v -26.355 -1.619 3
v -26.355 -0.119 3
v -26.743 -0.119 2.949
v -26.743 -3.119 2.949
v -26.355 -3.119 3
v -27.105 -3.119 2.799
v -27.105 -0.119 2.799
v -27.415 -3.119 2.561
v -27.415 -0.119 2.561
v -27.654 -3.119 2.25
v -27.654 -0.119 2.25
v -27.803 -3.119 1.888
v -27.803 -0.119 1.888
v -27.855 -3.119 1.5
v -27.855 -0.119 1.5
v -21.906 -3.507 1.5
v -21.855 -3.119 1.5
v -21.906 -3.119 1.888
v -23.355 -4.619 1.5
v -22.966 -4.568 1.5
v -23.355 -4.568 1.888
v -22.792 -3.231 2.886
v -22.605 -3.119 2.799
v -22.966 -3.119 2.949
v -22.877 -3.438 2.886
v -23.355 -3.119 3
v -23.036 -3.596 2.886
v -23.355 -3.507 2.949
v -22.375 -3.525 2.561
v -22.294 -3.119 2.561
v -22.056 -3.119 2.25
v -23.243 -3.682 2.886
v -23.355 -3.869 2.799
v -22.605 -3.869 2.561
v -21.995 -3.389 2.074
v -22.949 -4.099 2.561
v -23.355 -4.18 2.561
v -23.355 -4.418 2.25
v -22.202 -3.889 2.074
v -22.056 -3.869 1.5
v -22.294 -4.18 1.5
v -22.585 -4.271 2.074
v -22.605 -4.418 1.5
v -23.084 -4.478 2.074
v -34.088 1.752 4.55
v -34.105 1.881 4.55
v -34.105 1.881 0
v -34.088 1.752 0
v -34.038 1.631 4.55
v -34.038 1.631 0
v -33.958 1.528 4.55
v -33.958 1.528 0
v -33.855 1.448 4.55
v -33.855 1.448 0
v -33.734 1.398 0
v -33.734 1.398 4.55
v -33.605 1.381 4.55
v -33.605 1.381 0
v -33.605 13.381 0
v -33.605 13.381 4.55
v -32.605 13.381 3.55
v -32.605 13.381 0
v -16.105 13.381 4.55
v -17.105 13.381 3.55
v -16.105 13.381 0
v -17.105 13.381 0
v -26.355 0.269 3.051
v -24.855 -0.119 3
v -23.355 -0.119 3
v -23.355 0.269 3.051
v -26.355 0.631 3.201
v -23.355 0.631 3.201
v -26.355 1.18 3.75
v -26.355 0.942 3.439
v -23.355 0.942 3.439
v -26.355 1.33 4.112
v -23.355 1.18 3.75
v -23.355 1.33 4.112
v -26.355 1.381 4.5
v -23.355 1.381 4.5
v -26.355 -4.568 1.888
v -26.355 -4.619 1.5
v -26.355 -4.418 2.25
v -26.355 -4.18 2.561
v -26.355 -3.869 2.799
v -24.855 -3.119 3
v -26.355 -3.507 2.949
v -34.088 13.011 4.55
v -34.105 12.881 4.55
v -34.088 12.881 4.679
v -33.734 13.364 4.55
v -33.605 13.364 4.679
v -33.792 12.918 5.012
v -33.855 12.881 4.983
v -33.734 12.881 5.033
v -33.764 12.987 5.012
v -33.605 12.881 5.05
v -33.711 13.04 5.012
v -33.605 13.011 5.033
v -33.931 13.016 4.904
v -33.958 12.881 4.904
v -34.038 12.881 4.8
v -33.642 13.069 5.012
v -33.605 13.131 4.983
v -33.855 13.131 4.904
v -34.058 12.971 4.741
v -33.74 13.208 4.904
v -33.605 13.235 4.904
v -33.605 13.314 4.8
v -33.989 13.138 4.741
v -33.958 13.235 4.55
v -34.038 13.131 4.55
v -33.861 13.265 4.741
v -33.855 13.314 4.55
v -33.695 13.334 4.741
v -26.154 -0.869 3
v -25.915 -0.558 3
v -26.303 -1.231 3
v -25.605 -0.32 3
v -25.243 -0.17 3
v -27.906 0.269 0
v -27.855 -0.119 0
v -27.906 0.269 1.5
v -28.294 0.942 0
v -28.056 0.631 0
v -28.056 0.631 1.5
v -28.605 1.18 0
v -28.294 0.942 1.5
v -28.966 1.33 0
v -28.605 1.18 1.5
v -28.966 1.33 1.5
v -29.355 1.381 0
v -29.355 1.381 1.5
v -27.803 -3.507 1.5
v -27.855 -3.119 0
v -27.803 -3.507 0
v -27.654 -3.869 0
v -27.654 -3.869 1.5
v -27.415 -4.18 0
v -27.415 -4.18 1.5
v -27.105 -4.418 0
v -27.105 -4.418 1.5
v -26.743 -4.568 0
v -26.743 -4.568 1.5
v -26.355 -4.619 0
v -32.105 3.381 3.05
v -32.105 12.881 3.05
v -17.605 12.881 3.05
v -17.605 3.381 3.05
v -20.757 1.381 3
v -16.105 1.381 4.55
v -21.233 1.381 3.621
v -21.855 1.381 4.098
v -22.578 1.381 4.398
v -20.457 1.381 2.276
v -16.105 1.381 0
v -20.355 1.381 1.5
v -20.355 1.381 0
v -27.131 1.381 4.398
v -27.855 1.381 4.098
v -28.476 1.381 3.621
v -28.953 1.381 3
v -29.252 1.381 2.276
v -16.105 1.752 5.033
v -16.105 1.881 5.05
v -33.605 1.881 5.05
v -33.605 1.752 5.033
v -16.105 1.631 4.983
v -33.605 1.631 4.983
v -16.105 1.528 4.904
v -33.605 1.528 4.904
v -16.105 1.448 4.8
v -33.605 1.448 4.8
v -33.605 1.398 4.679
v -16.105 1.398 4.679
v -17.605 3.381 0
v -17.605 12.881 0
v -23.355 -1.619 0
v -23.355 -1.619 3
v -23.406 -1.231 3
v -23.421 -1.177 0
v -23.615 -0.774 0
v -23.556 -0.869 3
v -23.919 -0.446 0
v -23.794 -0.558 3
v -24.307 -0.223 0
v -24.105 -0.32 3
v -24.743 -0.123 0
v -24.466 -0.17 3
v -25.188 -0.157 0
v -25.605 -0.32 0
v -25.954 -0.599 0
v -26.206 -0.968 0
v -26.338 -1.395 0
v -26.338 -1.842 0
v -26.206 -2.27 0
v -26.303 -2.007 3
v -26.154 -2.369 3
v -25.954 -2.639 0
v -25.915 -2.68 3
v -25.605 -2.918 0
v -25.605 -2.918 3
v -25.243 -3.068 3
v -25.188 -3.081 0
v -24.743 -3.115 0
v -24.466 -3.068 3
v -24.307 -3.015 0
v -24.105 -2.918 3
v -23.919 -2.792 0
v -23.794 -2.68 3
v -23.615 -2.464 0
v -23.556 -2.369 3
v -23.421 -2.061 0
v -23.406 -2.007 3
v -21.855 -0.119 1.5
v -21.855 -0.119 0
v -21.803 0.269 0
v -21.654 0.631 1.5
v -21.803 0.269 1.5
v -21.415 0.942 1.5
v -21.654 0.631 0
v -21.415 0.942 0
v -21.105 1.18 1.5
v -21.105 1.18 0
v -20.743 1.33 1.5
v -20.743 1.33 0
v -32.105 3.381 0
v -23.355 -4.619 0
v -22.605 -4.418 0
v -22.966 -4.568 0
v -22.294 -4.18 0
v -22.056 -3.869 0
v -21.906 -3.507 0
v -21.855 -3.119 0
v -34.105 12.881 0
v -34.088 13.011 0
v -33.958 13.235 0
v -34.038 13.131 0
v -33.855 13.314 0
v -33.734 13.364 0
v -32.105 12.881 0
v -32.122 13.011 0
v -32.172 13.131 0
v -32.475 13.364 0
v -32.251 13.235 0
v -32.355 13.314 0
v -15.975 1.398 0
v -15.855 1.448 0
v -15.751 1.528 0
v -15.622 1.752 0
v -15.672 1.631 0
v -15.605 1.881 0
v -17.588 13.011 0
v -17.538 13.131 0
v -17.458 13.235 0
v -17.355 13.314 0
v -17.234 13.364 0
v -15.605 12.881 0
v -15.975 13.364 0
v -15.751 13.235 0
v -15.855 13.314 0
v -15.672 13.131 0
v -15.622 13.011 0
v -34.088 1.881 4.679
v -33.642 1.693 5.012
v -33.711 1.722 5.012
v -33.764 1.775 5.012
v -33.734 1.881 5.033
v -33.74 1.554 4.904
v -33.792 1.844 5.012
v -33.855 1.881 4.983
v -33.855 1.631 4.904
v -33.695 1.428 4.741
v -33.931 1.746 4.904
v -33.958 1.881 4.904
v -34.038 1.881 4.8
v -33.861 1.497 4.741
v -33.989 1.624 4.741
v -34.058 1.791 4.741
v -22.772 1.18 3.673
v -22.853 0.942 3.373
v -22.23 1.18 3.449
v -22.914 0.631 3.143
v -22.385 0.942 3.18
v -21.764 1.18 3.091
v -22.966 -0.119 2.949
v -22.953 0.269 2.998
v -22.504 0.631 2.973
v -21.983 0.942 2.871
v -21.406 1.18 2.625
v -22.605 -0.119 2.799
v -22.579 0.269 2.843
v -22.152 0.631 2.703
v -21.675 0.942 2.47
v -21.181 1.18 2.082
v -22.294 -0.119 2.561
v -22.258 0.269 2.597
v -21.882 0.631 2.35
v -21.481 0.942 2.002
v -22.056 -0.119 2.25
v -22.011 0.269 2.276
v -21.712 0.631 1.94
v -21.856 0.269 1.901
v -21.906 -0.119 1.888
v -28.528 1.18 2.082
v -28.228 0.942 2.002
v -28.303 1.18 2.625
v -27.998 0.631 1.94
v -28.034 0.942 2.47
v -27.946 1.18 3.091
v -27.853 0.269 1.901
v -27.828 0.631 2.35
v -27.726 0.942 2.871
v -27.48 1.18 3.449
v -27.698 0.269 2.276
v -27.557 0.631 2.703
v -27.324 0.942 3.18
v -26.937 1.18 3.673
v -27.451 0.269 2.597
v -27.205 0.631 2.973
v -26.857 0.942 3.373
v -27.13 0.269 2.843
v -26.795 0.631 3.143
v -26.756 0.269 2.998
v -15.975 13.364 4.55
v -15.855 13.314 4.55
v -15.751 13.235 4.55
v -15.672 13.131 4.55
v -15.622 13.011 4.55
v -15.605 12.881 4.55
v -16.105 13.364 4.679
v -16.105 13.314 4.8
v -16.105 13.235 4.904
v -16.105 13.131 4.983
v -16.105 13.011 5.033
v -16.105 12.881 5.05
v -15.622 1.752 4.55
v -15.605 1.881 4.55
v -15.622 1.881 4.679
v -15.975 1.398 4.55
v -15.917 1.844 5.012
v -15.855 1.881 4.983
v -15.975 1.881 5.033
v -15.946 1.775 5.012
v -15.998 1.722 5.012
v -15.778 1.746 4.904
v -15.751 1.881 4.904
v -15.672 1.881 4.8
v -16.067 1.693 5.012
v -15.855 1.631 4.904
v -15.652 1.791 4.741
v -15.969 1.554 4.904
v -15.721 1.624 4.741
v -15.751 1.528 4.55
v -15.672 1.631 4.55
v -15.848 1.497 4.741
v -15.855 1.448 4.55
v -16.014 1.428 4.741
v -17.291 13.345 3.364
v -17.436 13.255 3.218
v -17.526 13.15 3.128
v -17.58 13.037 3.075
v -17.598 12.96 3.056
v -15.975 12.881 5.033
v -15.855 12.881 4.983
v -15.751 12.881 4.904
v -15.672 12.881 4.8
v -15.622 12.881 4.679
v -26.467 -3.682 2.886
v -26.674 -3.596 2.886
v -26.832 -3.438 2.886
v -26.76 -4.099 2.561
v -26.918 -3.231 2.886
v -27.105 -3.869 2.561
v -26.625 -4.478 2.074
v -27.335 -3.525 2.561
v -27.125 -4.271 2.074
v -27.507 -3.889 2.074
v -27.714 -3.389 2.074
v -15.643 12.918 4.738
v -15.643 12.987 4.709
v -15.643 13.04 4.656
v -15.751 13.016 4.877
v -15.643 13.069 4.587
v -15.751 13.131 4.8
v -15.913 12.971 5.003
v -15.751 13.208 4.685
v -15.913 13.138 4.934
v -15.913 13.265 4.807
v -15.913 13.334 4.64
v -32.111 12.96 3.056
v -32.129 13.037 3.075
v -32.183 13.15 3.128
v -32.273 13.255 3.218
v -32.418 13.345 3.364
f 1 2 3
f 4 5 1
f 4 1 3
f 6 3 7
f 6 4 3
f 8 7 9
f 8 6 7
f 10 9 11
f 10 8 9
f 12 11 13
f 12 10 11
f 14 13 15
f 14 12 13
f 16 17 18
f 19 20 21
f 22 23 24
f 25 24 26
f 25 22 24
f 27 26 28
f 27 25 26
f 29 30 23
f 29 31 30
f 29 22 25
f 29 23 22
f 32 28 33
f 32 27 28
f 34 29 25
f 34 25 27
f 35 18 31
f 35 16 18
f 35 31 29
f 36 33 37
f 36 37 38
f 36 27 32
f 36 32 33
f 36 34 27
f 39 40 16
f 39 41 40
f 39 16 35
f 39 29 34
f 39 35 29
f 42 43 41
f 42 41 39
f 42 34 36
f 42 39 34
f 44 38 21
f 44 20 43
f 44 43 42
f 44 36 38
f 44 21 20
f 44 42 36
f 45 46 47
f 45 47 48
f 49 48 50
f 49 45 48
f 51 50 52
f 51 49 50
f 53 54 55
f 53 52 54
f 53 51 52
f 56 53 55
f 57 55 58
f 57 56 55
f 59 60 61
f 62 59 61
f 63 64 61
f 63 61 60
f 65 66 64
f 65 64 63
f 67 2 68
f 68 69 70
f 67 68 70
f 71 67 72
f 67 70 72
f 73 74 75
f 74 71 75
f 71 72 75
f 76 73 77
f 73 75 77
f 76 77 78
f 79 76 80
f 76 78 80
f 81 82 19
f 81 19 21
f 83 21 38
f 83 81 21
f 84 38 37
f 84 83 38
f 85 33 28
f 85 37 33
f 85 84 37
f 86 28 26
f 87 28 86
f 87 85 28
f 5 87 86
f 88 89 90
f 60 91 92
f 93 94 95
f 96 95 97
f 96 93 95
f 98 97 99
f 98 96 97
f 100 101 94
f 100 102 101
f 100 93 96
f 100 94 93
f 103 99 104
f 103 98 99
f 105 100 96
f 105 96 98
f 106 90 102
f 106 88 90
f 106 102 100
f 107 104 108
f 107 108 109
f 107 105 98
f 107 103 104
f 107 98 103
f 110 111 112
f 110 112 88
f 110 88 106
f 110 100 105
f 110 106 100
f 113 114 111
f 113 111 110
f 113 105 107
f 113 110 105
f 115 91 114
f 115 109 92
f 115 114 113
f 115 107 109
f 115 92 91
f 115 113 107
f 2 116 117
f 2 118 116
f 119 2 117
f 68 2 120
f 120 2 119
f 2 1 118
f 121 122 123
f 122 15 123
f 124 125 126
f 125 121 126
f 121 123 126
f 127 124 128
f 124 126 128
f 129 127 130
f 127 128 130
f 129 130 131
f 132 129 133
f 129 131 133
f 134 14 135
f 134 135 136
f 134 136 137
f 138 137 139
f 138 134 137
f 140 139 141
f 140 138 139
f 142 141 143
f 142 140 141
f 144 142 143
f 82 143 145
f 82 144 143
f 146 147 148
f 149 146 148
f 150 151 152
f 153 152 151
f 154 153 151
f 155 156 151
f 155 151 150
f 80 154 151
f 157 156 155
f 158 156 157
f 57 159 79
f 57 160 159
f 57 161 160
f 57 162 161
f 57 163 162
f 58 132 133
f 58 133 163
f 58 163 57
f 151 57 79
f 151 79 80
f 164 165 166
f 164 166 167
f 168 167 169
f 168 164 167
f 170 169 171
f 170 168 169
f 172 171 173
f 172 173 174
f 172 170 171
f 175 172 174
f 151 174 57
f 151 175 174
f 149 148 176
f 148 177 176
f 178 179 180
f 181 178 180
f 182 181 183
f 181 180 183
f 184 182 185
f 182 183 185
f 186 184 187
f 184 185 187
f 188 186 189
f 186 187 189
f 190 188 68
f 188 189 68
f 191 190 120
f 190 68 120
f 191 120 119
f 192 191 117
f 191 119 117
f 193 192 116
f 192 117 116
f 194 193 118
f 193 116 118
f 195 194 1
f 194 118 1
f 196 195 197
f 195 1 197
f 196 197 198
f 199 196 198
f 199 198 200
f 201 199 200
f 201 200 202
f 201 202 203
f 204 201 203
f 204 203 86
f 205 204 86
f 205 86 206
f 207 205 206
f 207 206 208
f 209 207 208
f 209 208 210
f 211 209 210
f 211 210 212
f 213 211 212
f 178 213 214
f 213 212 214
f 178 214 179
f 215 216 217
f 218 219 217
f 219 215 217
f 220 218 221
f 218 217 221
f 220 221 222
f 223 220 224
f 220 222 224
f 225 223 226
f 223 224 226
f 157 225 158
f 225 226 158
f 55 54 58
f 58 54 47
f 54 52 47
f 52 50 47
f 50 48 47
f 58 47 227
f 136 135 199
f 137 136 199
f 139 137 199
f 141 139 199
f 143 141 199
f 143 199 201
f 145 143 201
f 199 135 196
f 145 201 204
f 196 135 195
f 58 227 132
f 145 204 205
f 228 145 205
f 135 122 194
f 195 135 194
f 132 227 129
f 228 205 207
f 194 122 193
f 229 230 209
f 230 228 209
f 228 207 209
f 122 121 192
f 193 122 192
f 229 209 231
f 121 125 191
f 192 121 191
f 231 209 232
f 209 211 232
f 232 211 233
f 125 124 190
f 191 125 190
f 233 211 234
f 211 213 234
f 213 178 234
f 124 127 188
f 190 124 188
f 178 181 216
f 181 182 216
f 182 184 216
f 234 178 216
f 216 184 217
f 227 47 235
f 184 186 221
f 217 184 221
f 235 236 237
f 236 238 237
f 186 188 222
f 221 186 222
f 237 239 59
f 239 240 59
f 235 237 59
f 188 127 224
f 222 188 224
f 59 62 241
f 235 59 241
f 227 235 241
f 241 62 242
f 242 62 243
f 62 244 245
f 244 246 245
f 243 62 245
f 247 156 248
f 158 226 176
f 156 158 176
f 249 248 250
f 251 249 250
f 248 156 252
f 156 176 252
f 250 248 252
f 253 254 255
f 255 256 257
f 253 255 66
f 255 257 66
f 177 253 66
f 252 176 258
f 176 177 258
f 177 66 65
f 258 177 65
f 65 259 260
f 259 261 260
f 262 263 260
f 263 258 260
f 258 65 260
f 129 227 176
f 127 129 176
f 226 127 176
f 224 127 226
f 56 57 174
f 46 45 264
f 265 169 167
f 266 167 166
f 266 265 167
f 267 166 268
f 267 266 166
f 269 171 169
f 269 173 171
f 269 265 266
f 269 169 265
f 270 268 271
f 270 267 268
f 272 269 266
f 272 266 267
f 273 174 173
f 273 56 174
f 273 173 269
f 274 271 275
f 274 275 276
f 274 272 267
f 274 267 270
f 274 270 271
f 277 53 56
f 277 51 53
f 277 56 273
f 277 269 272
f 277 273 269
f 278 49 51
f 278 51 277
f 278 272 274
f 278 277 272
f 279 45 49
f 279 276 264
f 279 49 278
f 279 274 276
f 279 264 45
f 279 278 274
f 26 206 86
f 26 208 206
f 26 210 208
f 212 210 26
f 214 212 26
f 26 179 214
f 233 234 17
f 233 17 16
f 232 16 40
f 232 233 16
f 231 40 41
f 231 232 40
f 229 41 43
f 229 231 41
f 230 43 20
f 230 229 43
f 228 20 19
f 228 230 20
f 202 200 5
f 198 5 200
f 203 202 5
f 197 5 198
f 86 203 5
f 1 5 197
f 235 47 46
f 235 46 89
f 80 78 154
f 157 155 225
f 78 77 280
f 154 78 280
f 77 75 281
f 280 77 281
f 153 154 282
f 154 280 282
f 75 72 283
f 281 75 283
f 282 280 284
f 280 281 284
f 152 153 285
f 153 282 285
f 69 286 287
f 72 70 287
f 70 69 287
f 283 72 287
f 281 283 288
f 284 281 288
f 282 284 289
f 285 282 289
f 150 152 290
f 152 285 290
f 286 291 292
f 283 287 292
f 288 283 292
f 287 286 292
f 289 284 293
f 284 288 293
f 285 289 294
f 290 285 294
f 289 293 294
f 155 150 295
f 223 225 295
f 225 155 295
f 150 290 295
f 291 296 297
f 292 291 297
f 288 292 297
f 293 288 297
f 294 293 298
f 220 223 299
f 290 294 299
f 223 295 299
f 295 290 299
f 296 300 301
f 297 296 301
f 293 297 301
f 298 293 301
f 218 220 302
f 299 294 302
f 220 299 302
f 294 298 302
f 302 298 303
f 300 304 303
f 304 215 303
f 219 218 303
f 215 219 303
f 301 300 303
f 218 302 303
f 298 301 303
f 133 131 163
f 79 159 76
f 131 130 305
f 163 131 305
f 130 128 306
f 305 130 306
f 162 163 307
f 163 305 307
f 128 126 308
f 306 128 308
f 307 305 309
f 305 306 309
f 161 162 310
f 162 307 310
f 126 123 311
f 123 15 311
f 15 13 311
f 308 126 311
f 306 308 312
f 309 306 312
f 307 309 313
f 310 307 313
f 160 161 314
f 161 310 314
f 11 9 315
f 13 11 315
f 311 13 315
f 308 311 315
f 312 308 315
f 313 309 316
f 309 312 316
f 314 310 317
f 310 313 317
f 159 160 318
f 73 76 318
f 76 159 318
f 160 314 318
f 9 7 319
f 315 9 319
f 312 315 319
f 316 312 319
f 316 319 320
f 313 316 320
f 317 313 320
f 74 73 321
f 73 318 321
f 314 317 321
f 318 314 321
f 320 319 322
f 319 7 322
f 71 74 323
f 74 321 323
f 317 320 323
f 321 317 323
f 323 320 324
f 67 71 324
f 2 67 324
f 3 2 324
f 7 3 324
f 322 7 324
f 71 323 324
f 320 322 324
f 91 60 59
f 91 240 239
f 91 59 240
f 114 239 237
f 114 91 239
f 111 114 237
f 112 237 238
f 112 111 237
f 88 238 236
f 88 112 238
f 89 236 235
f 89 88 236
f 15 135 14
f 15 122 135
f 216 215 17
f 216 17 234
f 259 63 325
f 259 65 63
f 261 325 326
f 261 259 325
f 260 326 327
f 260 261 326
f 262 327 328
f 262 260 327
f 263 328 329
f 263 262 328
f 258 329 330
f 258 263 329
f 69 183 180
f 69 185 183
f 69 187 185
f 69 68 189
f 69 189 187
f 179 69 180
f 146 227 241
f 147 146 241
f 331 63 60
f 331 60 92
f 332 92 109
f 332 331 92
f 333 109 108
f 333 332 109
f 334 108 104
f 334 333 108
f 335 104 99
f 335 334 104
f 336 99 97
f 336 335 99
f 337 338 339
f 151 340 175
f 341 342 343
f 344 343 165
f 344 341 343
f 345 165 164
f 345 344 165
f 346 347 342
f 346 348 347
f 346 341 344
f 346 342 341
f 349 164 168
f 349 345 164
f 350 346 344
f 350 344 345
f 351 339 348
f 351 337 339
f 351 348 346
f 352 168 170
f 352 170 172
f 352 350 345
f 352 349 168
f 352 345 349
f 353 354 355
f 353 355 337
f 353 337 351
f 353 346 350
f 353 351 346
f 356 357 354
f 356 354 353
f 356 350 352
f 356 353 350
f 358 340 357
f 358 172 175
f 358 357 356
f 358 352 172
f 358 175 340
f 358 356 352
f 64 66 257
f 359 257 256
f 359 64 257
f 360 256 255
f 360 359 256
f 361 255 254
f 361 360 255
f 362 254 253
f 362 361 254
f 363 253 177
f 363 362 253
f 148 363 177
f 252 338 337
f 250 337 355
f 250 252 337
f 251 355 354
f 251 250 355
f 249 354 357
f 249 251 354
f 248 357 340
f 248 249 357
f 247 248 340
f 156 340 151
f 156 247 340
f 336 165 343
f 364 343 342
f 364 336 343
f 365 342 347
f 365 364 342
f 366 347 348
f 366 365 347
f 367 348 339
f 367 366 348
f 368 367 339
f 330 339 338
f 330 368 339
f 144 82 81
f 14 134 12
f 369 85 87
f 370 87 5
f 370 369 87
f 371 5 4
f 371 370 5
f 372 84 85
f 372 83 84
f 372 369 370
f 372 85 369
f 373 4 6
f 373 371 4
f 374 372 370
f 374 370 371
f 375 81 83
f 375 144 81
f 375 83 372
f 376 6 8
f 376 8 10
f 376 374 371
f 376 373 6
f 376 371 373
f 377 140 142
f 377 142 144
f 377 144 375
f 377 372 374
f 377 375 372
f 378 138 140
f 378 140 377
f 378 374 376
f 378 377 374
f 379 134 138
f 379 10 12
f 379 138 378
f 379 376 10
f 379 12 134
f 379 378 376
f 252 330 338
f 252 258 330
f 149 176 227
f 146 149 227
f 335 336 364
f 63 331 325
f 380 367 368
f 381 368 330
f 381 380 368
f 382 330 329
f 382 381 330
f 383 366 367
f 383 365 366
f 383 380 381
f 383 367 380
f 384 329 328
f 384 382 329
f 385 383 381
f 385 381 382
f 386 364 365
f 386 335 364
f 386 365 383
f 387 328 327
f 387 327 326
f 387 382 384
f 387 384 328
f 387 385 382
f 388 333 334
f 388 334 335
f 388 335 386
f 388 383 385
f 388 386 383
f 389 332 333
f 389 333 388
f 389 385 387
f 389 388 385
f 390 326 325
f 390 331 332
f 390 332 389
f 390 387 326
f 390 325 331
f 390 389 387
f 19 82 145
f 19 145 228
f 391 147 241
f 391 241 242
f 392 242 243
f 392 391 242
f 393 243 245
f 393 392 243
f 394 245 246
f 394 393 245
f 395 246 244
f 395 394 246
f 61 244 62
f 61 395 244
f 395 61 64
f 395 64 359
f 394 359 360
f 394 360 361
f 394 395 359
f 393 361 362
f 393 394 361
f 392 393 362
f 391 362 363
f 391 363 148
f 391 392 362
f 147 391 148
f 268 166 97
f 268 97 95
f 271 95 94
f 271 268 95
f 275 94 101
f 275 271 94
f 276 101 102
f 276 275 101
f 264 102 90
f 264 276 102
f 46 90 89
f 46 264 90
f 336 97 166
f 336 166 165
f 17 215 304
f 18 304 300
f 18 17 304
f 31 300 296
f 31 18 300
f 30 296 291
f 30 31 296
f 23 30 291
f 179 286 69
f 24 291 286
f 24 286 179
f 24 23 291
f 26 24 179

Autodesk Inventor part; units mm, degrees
ref_plane "YZ Plane" through (0, 0, 0) normal (1, 0, 0) x (0, 1, 0)
ref_plane "XZ Plane" through (0, 0, 0) normal (0, 1, 0) x (-1, 0, 0)
sketch "Sketch1" plane through (0, 0, 0) normal (0, 0, 1) x (1, 0, 0)
  line L0 (-32.1046, 28.3811) -> (-17.6046, 28.3811) projected
  line L1 (-32.1046, 3.3811) -> (-32.1046, 28.3811) projected
  line L2 (-17.6046, 3.3811) -> (-32.1046, 3.3811) projected
  line L3 (-17.6046, 28.3811) -> (-17.6046, 3.3811) projected
  circle A0 centre (-21.0446, 24.002) radius 0.51 projected
  circle A1 centre (-21.0446, 26.542) radius 0.51 projected
  circle A2 centre (-23.5846, 26.542) radius 0.51 projected
  circle A3 centre (-23.5846, 24.002) radius 0.51 projected
  circle A4 centre (-26.1246, 26.542) radius 0.51 projected
  circle A5 centre (-26.1246, 24.002) radius 0.51 projected
  circle A6 centre (-28.6646, 26.542) radius 0.51 projected
  circle A7 centre (-28.6646, 24.002) radius 0.51 projected
  line L4 (-17.6046, 3.3811) -> (-17.6046, 13.3811)
  line L5 (-17.6046, 13.3811) -> (-15.6046, 13.3811)
  line L6 (-15.6046, 13.3811) -> (-15.6046, 1.3811)
  line L7 (-15.6046, 1.3811) -> (-32.1046, 1.3811)
  line L8 (-32.1046, 1.3811) -> (-34.1046, 1.3811)
  line L9 (-34.1046, 1.3811) -> (-34.1046, 13.3811)
  line L10 (-34.1046, 13.3811) -> (-32.1046, 13.3811)
  point P0 (0, 0)
  dimension "d0" = 10
  dimension "d1" = 2
  dimension "d2" = 90
  dimension "d3" = 12
  dimension "d4" = 90
  dimension "d5" = 2
  dimension "d6" = 12
ref_plane "Work Plane1" through (-32.1046, 3.3811, 3.05) normal (0, 0, 1) x (1, 0, 0)
extrude "Extrusion1" add sketch "Sketch1" along normal up to surface (3.05 mm away) contours L1 L2 L3 L5 L6 L7 L8 L9 L10
sketch "Sketch2" plane through (-34.1046, 1.3811, 3.05) normal (0, 0, 1) x (1, 0, 0)
  line L0 (16.5, 12) -> (18.5, 12) projected
  line L1 (18.5, 12) -> (0, 12)
  line L2 (0, 12) -> (0, 0)
  line L3 (0, 0) -> (18.5, 0)
  line L4 (18.5, 0) -> (18.5, 12)
  point P0 (34.1046, -1.3811)
extrude "Extrusion2" add sketch "Sketch2" along normal blind 2
sketch "Sketch3" plane through (-34.1046, 1.3811, 0) normal (0, -1, 0) x (1, 0, 0)
  line L0 (16.5, 0) -> (2, 0) projected
  line L1 (9.25, 0) -> (6.25, 0)
  line L2 (6.25, 0) -> (6.25, 3)
  line L3 (6.25, 3) -> (9.25, 3)
  line L4 (9.25, 3) -> (9.25, 0)
  line L5 (9.25, 3) -> (12.25, 3)
  line L6 (12.25, 3) -> (12.25, 0)
  line L7 (12.25, 0) -> (9.25, 0)
  line L8 (9.25, 0) -> (9.25, 3)
  point P0 (34.1046, 0)
  dimension "d11" = 3
  dimension "d12" = 3
  dimension "d13" = 3
extrude "Extrusion3" add sketch "Sketch3" along normal blind 6
fillet "Fillet1" radius 1.5 8 edges at (-27.8546, -4.6189, 1.5) (-21.8546, -4.6189, 1.5) (-24.8546, 1.3811, 3) (-27.8546, 1.3811, 1.5) (-21.8546, 1.3811, 1.5) (-27.8546, -1.6189, 3) (-21.8546, -1.6189, 3) (-24.8546, -4.6189, 3)
sketch "Sketch4" plane through (-26.3546, -3.1189, 3) normal (0, 0, 1) x (1, 0, 0)
  line L0 (0, 3) -> (3, 3) projected
  line L1 (3, 3) -> (3, 0) projected
  circle A0 centre (1.5, 1.5) radius 1.5
  point P0 (26.3546, 3.1189)
  dimension "d17" = 3
extrude "Extrusion4" cut sketch "Sketch4" against normal blind 6 contours A0
fillet "Fillet2" radius 0.5 11 edges at (-15.6046, 1.3811, 2.525) (-34.1046, 1.3811, 2.525) (-24.8546, 1.3811, 5.05) (-34.1046, 13.3811, 2.525) (-24.8546, 13.3811, 5.05) (-15.6046, 13.3811, 2.525) (-24.8546, 13.3811, 3.05) (-17.6046, 13.3811, 1.525) (-32.1046, 13.3811, 1.525) (-34.1046, 7.3811, 5.05) (-15.6046, 7.3811, 5.05)
properties part number "soporte esp1"
